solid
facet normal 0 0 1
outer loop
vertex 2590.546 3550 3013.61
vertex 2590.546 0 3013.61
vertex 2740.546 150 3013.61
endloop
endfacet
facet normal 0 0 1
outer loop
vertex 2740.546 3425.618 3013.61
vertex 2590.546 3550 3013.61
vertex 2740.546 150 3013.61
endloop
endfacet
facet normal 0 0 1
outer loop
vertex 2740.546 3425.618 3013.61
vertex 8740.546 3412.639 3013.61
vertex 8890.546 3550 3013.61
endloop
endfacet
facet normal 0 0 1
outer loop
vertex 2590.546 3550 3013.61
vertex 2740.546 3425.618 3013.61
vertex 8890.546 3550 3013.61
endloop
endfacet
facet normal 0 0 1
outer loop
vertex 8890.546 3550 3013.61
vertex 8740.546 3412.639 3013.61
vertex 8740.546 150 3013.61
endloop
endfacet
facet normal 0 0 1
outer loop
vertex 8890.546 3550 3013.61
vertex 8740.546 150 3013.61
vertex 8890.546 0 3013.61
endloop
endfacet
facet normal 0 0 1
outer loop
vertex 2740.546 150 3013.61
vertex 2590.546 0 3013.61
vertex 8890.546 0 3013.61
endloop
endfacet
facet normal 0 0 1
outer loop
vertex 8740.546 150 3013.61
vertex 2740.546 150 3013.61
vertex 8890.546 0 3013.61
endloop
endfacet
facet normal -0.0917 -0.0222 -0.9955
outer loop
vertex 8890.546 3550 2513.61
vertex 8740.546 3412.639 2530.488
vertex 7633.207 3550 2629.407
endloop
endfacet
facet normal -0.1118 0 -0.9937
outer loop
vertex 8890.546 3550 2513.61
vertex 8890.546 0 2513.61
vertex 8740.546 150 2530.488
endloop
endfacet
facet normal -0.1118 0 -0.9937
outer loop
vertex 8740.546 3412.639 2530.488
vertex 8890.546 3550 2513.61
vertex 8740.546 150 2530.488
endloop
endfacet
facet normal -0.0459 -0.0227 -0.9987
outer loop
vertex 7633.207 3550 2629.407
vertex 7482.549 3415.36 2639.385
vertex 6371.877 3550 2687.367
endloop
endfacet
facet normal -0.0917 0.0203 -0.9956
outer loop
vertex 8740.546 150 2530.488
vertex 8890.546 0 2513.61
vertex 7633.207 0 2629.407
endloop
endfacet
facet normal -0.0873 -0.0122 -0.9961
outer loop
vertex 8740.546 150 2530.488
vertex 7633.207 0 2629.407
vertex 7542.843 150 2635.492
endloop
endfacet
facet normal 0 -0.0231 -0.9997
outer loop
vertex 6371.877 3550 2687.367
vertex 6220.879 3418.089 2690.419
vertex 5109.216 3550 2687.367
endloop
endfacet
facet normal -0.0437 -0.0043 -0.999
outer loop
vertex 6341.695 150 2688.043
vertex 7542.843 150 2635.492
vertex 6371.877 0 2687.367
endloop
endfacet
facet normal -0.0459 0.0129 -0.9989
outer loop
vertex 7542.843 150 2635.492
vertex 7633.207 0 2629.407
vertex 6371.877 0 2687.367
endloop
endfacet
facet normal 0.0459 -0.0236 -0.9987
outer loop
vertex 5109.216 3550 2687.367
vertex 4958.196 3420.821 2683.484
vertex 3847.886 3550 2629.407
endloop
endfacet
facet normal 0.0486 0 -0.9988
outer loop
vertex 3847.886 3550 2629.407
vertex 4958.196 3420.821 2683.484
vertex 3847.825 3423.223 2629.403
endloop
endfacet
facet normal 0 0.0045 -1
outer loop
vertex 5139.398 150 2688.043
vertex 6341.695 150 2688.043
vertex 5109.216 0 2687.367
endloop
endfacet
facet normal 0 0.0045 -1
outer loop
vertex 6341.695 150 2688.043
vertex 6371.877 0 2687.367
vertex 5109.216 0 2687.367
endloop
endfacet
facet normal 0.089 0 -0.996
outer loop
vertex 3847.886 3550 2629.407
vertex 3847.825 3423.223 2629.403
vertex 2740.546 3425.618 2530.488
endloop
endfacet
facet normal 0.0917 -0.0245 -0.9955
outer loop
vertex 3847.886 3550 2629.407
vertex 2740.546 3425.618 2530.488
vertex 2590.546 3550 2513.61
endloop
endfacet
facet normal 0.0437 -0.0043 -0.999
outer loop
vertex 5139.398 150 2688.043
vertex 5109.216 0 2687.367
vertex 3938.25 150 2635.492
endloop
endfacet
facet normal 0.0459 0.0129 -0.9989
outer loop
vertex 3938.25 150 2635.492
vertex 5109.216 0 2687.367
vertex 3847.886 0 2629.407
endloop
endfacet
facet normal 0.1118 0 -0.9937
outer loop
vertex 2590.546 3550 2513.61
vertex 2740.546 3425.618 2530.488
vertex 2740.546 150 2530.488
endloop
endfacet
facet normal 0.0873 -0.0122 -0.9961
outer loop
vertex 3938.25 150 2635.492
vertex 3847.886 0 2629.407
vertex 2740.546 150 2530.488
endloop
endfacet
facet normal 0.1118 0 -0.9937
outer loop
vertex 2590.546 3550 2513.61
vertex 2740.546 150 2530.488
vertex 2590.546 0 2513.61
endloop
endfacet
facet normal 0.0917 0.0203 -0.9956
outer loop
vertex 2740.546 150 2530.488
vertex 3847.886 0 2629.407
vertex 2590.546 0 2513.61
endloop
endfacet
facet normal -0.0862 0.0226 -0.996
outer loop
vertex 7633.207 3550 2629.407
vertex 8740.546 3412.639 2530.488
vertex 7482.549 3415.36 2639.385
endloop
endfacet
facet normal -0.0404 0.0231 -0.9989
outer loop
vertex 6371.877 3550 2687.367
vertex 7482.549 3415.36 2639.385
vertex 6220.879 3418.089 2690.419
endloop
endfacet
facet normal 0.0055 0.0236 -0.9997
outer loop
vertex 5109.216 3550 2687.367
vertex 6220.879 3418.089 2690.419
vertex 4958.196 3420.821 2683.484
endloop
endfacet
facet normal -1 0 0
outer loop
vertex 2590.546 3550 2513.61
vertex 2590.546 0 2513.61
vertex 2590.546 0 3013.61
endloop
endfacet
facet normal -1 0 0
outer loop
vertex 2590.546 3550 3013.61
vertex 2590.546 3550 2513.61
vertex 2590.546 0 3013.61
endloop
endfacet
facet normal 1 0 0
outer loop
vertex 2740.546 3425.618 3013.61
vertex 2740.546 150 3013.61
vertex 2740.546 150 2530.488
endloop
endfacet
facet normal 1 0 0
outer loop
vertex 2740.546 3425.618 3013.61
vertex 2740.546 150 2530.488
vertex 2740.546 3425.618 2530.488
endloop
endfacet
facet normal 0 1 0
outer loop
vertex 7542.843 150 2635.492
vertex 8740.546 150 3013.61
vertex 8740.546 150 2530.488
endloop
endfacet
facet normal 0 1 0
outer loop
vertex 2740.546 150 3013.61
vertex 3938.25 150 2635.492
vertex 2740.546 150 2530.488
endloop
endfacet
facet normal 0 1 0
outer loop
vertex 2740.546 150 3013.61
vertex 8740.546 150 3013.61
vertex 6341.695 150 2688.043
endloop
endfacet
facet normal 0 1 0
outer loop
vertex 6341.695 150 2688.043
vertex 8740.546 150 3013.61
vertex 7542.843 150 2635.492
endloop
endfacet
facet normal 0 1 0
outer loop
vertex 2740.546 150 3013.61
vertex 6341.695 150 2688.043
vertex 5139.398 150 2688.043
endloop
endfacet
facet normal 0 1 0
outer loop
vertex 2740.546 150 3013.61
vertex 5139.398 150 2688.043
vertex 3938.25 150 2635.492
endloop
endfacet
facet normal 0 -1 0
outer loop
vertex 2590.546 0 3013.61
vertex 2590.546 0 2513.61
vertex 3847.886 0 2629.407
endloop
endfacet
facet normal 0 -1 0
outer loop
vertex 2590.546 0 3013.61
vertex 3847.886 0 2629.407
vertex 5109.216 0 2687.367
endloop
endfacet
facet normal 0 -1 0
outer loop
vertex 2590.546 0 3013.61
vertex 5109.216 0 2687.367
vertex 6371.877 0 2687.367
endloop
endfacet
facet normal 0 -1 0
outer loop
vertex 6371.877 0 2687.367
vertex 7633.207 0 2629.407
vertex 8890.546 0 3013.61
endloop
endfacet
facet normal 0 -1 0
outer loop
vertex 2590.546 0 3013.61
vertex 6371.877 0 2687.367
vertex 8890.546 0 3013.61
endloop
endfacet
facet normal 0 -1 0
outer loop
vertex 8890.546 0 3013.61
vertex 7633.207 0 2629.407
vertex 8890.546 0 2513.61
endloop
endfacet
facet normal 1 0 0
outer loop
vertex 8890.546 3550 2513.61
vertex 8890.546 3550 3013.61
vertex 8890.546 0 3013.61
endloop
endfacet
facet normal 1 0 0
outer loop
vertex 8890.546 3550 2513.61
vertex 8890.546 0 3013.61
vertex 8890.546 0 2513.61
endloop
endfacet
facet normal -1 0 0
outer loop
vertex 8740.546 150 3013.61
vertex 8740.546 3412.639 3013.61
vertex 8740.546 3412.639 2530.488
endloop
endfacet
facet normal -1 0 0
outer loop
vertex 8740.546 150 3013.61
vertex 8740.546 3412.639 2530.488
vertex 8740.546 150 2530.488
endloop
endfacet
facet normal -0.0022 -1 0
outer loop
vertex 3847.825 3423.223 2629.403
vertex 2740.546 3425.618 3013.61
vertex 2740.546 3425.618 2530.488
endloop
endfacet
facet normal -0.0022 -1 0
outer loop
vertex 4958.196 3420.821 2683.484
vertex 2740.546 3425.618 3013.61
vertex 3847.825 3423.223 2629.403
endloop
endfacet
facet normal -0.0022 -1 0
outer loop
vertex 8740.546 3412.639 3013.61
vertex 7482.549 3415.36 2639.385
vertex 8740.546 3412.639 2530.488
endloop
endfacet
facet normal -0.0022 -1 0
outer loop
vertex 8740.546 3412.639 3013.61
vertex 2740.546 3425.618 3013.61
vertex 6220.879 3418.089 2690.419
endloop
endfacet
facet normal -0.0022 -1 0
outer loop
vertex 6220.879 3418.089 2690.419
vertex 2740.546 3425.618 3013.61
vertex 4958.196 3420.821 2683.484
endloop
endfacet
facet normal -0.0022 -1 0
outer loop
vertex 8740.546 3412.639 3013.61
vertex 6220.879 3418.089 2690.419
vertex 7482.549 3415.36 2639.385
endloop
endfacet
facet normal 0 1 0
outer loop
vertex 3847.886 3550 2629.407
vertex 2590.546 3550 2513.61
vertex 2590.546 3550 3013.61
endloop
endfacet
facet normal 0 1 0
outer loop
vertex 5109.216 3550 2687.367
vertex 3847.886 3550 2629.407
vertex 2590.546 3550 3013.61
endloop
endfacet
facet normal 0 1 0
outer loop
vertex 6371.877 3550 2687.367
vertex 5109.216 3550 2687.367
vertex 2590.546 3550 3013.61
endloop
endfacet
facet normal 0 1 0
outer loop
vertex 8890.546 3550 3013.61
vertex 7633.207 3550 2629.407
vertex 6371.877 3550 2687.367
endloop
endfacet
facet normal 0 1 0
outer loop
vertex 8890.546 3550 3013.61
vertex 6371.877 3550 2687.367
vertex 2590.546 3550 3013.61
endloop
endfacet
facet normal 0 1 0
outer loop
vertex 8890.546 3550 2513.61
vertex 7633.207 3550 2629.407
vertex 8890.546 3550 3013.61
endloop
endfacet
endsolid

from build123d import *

# Parameters (mm, degrees)
BOSS_EXTRUDE1_DEPTH = 3550
CUT_EXTRUDE1_DEPTH  = 6000


with BuildPart() as part:
    # Sketch2 → Boss-Extrude1 (new body)
    with BuildSketch(Plane(origin=(0, 0, 0), x_dir=(1, 0, 0), z_dir=(0, 1, 0))):
        with BuildLine():
            Line((2590.546480495, -3013.609856922), (8890.546480495, -3013.609856922))
            Line((8890.546480495, -3013.609856922), (8890.546480495, -2513.609856922))
            ThreePointArc((8890.546480495, -2513.609856922), (5740.546480495, -2694.614633818), (2590.546480495, -2513.609856922))
            Line((2590.546480495, -2513.609856922), (2590.546480495, -3013.609856922))
        make_face()
    extrude(amount=BOSS_EXTRUDE1_DEPTH)

    # Sketch3 → Cut-Extrude1 (cut)
    with BuildSketch(Plane.XY.offset(3013.609856922)):
        Polygon((2740.546480495, 3425.61786483), (8740.546480495, 3412.63855525), (8740.546480495, 150), (2740.546480495, 150), align=None)
    extrude(amount=-CUT_EXTRUDE1_DEPTH, mode=Mode.SUBTRACT)


solid = part.part
